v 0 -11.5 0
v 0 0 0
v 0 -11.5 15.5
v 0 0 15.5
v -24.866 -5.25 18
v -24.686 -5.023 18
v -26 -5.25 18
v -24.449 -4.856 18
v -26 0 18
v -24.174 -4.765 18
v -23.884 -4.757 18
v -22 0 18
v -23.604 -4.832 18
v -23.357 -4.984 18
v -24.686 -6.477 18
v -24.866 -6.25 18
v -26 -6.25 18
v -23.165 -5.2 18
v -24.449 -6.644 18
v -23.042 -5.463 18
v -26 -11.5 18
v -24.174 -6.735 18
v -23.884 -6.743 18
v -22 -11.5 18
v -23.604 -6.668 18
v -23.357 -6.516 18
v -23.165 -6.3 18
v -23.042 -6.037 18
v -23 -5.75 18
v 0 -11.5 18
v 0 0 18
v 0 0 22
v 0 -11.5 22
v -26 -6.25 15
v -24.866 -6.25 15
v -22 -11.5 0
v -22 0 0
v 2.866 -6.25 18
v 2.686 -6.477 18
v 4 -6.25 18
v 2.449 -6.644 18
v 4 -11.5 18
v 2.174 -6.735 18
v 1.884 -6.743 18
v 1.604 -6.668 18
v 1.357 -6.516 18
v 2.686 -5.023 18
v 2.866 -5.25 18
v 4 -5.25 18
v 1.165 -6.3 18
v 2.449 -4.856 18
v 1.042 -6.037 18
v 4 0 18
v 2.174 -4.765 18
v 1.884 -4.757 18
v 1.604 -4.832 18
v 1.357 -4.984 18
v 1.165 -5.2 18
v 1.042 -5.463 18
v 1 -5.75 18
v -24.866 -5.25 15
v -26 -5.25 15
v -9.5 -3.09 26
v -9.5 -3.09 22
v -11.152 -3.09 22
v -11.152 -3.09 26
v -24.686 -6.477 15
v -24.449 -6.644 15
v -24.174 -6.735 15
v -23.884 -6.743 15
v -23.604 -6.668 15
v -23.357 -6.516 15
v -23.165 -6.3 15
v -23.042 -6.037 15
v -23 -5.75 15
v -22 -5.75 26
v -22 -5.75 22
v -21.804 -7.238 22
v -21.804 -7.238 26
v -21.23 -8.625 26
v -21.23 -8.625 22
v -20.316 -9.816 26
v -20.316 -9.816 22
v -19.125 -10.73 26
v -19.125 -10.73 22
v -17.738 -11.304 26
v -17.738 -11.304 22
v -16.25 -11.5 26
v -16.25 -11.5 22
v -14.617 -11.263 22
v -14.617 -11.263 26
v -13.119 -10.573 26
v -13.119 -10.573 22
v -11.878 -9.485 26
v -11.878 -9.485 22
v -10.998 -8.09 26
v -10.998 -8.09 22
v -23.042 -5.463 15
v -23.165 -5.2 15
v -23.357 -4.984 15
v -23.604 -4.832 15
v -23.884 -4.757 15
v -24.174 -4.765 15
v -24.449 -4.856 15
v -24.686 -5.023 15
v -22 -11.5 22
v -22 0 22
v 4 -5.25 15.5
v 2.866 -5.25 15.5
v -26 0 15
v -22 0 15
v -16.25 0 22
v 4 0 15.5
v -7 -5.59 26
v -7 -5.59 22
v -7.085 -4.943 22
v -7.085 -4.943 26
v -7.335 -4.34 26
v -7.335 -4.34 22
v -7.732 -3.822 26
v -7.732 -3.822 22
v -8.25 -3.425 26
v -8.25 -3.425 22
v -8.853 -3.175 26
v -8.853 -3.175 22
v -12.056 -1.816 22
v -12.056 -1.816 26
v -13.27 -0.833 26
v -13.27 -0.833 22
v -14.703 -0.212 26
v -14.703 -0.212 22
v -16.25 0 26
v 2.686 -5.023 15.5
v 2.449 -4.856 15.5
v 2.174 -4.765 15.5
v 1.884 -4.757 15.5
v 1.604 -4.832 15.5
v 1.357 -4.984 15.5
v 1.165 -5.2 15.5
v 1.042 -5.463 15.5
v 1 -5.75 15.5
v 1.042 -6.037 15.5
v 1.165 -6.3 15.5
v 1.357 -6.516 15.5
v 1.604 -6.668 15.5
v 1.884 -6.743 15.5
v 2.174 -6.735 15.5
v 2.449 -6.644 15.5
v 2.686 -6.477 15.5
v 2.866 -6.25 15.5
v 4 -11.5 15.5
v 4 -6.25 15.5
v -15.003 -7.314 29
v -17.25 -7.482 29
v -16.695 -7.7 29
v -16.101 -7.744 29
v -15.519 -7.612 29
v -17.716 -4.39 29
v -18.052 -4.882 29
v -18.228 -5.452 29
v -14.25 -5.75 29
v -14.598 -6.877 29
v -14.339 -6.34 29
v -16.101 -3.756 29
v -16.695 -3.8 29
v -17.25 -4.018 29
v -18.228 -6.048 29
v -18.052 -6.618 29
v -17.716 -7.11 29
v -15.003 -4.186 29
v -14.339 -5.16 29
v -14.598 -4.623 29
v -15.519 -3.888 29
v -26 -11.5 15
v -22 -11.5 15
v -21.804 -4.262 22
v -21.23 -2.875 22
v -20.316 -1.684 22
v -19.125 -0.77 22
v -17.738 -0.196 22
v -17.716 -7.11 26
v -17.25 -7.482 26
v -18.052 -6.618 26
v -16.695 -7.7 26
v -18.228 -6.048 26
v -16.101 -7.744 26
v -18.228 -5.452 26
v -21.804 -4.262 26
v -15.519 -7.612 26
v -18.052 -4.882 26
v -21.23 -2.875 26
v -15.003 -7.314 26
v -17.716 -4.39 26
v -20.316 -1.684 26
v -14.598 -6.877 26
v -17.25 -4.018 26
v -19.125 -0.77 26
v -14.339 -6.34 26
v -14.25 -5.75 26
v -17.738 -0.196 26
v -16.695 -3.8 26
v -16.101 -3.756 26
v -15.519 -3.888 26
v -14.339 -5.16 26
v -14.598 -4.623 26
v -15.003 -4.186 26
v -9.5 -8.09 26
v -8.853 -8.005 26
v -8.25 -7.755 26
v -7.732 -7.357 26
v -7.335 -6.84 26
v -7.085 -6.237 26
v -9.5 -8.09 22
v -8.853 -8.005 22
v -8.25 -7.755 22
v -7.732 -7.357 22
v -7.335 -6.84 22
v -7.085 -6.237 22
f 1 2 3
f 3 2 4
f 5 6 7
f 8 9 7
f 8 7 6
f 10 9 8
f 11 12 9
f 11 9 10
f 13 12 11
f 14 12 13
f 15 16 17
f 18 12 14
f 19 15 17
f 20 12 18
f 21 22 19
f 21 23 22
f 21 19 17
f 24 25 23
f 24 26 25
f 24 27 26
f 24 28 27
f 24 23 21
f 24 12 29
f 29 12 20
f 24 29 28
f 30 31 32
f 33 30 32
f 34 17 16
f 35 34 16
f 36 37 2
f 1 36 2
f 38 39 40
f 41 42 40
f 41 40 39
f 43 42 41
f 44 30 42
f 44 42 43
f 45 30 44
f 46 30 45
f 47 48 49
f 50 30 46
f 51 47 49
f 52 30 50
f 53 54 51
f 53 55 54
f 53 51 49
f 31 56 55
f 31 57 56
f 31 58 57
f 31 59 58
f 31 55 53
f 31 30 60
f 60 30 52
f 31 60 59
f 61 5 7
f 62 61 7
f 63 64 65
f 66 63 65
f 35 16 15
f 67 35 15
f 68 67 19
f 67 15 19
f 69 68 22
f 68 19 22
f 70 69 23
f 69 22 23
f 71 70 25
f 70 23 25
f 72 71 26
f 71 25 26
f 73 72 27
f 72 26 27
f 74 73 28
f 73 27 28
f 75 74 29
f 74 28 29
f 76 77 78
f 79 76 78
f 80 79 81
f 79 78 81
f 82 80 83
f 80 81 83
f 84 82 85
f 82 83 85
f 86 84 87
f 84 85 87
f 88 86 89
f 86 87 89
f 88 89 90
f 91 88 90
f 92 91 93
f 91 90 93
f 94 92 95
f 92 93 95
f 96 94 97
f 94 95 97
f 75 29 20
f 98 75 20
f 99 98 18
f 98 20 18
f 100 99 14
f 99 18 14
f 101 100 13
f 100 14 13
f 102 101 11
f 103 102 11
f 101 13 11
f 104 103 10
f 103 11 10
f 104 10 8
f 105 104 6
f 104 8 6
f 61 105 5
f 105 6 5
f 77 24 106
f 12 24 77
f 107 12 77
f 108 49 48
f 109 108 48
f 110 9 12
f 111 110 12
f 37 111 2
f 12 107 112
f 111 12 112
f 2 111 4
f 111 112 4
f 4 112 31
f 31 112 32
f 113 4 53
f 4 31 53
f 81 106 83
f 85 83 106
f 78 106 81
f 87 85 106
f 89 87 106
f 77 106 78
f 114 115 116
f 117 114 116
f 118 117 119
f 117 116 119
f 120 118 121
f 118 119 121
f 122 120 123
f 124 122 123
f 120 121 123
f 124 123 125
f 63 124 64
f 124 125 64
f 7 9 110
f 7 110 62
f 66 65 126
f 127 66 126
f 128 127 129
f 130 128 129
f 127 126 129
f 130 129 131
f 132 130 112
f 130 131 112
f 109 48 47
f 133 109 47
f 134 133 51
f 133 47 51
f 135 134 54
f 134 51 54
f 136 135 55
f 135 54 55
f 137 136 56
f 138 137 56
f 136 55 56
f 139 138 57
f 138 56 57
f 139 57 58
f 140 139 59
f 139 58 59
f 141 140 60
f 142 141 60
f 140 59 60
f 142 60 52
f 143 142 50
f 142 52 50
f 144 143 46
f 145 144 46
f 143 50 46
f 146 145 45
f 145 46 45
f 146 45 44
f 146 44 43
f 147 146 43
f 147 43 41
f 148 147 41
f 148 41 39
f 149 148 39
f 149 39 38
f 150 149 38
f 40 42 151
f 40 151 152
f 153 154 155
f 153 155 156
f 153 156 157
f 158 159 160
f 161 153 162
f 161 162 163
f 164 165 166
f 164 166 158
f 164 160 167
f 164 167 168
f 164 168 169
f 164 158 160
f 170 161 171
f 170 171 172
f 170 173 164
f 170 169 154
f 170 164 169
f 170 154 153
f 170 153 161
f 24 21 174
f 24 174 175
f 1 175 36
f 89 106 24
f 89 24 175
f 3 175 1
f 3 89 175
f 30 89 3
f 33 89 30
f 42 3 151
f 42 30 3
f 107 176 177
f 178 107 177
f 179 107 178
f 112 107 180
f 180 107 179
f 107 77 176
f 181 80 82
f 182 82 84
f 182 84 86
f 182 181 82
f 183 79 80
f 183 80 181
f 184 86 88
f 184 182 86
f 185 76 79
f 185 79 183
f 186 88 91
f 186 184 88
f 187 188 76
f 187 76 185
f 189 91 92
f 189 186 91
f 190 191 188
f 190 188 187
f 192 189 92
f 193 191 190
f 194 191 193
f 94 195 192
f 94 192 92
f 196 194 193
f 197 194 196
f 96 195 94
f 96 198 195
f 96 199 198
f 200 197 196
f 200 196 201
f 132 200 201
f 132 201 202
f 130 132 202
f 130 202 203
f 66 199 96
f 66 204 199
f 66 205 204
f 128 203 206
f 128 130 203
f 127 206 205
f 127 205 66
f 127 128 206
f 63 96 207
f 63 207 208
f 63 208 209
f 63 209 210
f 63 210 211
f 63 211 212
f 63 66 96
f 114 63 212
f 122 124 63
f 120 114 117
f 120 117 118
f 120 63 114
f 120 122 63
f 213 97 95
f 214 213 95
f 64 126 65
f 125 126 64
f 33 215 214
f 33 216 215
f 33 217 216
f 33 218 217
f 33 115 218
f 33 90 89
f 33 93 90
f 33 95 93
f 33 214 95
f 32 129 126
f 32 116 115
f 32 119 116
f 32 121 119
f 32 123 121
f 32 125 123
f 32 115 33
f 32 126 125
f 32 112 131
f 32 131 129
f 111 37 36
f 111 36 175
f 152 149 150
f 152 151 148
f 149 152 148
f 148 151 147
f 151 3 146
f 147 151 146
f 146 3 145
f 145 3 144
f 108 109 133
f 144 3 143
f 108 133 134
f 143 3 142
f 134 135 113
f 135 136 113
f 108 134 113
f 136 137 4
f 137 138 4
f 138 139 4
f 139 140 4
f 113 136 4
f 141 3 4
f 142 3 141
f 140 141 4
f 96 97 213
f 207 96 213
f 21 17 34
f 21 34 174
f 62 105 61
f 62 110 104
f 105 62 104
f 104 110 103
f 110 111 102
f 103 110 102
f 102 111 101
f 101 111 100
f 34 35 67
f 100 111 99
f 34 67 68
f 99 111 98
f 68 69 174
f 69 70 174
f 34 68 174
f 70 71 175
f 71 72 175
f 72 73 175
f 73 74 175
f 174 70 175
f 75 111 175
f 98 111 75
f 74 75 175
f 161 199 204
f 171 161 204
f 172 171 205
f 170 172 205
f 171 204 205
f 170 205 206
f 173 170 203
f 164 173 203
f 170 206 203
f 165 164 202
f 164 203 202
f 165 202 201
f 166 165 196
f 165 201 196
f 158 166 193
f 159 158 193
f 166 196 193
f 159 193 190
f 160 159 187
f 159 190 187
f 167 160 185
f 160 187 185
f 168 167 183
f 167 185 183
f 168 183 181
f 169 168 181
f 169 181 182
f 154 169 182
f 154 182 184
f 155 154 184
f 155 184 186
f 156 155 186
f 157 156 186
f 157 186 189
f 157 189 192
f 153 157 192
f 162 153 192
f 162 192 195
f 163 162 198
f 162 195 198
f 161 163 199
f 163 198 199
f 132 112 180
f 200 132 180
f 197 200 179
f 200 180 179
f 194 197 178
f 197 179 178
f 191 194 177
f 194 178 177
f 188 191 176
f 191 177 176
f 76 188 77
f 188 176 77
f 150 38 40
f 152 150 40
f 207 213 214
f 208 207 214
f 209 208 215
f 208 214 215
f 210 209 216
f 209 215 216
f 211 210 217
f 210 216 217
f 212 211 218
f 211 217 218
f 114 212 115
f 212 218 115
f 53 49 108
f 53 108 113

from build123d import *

# Parameters (mm, degrees)
F0_W      = 22
F0_H      = 22
F1_DEPTH  = 11.5
F3_DEPTH  = 4
F4_R      = 2
F5_DEPTH  = 3
F6_W      = 11.5
F6_H      = 2.5
F7_DEPTH  = 4
F8_W      = 11.5
F8_H      = 3
F9_DEPTH  = 4
F11_DEPTH = 25.4
F13_DEPTH = 25.4


with BuildPart() as f1:
    # F0 (on Front) → F1 (new body)
    with BuildSketch(Plane.XZ):
        with Locations((-11, 11)):
            Rectangle(F0_W, F0_H)
    extrude(amount=F1_DEPTH)

    # F2 (on face) → F3 (join)
    with BuildSketch(Plane.XY.offset(22)):
        with BuildLine():
            ThreePointArc((-10.8406771994, -7.6998017434), (-11.9992952148, -5.6490453843), (-10.9393399136, -3.5455977121))
            ThreePointArc((-10.9393399136, -3.5455977121), (-11.0408940925, -3.3153099489), (-11.1524285962, -3.0896869013))
            ThreePointArc((-11.1524285962, -3.0896869013), (-13.2695889812, -0.8327192312), (-16.25, 0))
            ThreePointArc((-16.25, 0), (-20.3158639918, -1.6841360082), (-22, -5.75))
            ThreePointArc((-22, -5.75), (-20.3158639918, -9.8158639918), (-16.25, -11.5))
            ThreePointArc((-16.25, -11.5), (-13.1187622002, -10.5726393024), (-10.9975372249, -8.0896869013))
            ThreePointArc((-10.9975372249, -8.0896869013), (-10.9155440273, -7.8961778759), (-10.8406771994, -7.6998017434))
        make_face()
        with BuildLine():
            ThreePointArc((-10.8406771994, -7.6998017434), (-10.5858095855, -6.7396701209), (-10.5, -5.75))
            ThreePointArc((-10.5, -5.75), (-10.6109045275, -4.6261217808), (-10.9393399136, -3.5455977121))
            ThreePointArc((-10.9393399136, -3.5455977121), (-11.9992952148, -5.6490453843), (-10.8406771994, -7.6998017434))
        make_face()
        with BuildLine():
            ThreePointArc((-10.9393399136, -3.5455977121), (-10.6109045275, -4.6261217808), (-10.5, -5.75))
            ThreePointArc((-10.5, -5.75), (-10.5858095855, -6.7396701209), (-10.8406771994, -7.6998017434))
            ThreePointArc((-10.8406771994, -7.6998017434), (-10.1981091944, -7.9902375782), (-9.5, -8.0896869013))
            ThreePointArc((-9.5, -8.0896869013), (-7.732233047, -7.3574538542), (-7, -5.5896869013))
            ThreePointArc((-7, -5.5896869013), (-7.732233047, -3.8219199483), (-9.5, -3.0896869013))
            ThreePointArc((-9.5, -3.0896869013), (-10.2549096062, -3.2063884545), (-10.9393399136, -3.5455977121))
        make_face()
        with BuildLine():
            ThreePointArc((-11.1524285962, -3.0896869013), (-11.0408940925, -3.3153099489), (-10.9393399136, -3.5455977121))
            ThreePointArc((-10.9393399136, -3.5455977121), (-10.2549096062, -3.2063884545), (-9.5, -3.0896869013))
            Line((-9.5, -3.0896869013), (-11.1524285962, -3.0896869013))
        make_face()
        with BuildLine():
            ThreePointArc((-9.5, -8.0896869013), (-10.1981091944, -7.9902375782), (-10.8406771994, -7.6998017434))
            ThreePointArc((-10.8406771994, -7.6998017434), (-10.9155440273, -7.8961778759), (-10.9975372249, -8.0896869013))
            Line((-10.9975372249, -8.0896869013), (-9.5, -8.0896869013))
        make_face()
    extrude(amount=F3_DEPTH)

    # F4 (on face) → F5 (join)
    with BuildSketch(Plane.XY.offset(26)):
        with Locations((-16.25, -5.75)):
            Circle(F4_R)
    extrude(amount=F5_DEPTH)

    # F6 (on face) → F7 (join)
    with BuildSketch(Plane.YZ):
        with Locations((-5.75, 16.75)):
            Rectangle(F6_W, F6_H)
    extrude(amount=F7_DEPTH)

    # F8 (on face) → F9 (join)
    with BuildSketch(Plane(origin=(-22, 0, 0), x_dir=(0, -1, 0), z_dir=(-1, 0, 0))):
        with Locations((5.75, 16.5)):
            Rectangle(F8_W, F8_H)
    extrude(amount=F9_DEPTH)

    # F10 (on face) → F11 (cut)
    with BuildSketch(Plane.XY.offset(18)):
        with BuildLine():
            ThreePointArc((-24.8660254038, -6.25), (-23.7411809549, -6.7159258263), (-23, -5.75))
            ThreePointArc((-23, -5.75), (-23.7411809549, -4.7840741737), (-24.8660254038, -5.25))
            ThreePointArc((-24.8660254038, -5.25), (-25, -5.75), (-24.8660254038, -6.25))
        make_face()
        with BuildLine():
            ThreePointArc((-24.8660254038, -6.25), (-25, -5.75), (-24.8660254038, -5.25))
            Line((-24.8660254038, -5.25), (-26, -5.25))
            Line((-26, -5.25), (-26, -6.25))
            Line((-26, -6.25), (-24.8660254038, -6.25))
        make_face()
    extrude(amount=-F11_DEPTH, mode=Mode.SUBTRACT)

    # F12 (on face) → F13 (cut)
    with BuildSketch(Plane.XY.offset(18)):
        with BuildLine():
            ThreePointArc((2.8660254038, -6.25), (2.9659258263, -6.0088190451), (3, -5.75))
            ThreePointArc((3, -5.75), (2.9659258263, -5.4911809549), (2.8660254038, -5.25))
            ThreePointArc((2.8660254038, -5.25), (1, -5.75), (2.8660254038, -6.25))
        make_face()
        with BuildLine():
            ThreePointArc((2.8660254038, -5.25), (2.9659258263, -5.4911809549), (3, -5.75))
            ThreePointArc((3, -5.75), (2.9659258263, -6.0088190451), (2.8660254038, -6.25))
            Line((2.8660254038, -6.25), (4, -6.25))
            Line((4, -6.25), (4, -5.25))
            Line((4, -5.25), (2.8660254038, -5.25))
        make_face()
    extrude(amount=-F13_DEPTH, mode=Mode.SUBTRACT)


solid = f1.part
